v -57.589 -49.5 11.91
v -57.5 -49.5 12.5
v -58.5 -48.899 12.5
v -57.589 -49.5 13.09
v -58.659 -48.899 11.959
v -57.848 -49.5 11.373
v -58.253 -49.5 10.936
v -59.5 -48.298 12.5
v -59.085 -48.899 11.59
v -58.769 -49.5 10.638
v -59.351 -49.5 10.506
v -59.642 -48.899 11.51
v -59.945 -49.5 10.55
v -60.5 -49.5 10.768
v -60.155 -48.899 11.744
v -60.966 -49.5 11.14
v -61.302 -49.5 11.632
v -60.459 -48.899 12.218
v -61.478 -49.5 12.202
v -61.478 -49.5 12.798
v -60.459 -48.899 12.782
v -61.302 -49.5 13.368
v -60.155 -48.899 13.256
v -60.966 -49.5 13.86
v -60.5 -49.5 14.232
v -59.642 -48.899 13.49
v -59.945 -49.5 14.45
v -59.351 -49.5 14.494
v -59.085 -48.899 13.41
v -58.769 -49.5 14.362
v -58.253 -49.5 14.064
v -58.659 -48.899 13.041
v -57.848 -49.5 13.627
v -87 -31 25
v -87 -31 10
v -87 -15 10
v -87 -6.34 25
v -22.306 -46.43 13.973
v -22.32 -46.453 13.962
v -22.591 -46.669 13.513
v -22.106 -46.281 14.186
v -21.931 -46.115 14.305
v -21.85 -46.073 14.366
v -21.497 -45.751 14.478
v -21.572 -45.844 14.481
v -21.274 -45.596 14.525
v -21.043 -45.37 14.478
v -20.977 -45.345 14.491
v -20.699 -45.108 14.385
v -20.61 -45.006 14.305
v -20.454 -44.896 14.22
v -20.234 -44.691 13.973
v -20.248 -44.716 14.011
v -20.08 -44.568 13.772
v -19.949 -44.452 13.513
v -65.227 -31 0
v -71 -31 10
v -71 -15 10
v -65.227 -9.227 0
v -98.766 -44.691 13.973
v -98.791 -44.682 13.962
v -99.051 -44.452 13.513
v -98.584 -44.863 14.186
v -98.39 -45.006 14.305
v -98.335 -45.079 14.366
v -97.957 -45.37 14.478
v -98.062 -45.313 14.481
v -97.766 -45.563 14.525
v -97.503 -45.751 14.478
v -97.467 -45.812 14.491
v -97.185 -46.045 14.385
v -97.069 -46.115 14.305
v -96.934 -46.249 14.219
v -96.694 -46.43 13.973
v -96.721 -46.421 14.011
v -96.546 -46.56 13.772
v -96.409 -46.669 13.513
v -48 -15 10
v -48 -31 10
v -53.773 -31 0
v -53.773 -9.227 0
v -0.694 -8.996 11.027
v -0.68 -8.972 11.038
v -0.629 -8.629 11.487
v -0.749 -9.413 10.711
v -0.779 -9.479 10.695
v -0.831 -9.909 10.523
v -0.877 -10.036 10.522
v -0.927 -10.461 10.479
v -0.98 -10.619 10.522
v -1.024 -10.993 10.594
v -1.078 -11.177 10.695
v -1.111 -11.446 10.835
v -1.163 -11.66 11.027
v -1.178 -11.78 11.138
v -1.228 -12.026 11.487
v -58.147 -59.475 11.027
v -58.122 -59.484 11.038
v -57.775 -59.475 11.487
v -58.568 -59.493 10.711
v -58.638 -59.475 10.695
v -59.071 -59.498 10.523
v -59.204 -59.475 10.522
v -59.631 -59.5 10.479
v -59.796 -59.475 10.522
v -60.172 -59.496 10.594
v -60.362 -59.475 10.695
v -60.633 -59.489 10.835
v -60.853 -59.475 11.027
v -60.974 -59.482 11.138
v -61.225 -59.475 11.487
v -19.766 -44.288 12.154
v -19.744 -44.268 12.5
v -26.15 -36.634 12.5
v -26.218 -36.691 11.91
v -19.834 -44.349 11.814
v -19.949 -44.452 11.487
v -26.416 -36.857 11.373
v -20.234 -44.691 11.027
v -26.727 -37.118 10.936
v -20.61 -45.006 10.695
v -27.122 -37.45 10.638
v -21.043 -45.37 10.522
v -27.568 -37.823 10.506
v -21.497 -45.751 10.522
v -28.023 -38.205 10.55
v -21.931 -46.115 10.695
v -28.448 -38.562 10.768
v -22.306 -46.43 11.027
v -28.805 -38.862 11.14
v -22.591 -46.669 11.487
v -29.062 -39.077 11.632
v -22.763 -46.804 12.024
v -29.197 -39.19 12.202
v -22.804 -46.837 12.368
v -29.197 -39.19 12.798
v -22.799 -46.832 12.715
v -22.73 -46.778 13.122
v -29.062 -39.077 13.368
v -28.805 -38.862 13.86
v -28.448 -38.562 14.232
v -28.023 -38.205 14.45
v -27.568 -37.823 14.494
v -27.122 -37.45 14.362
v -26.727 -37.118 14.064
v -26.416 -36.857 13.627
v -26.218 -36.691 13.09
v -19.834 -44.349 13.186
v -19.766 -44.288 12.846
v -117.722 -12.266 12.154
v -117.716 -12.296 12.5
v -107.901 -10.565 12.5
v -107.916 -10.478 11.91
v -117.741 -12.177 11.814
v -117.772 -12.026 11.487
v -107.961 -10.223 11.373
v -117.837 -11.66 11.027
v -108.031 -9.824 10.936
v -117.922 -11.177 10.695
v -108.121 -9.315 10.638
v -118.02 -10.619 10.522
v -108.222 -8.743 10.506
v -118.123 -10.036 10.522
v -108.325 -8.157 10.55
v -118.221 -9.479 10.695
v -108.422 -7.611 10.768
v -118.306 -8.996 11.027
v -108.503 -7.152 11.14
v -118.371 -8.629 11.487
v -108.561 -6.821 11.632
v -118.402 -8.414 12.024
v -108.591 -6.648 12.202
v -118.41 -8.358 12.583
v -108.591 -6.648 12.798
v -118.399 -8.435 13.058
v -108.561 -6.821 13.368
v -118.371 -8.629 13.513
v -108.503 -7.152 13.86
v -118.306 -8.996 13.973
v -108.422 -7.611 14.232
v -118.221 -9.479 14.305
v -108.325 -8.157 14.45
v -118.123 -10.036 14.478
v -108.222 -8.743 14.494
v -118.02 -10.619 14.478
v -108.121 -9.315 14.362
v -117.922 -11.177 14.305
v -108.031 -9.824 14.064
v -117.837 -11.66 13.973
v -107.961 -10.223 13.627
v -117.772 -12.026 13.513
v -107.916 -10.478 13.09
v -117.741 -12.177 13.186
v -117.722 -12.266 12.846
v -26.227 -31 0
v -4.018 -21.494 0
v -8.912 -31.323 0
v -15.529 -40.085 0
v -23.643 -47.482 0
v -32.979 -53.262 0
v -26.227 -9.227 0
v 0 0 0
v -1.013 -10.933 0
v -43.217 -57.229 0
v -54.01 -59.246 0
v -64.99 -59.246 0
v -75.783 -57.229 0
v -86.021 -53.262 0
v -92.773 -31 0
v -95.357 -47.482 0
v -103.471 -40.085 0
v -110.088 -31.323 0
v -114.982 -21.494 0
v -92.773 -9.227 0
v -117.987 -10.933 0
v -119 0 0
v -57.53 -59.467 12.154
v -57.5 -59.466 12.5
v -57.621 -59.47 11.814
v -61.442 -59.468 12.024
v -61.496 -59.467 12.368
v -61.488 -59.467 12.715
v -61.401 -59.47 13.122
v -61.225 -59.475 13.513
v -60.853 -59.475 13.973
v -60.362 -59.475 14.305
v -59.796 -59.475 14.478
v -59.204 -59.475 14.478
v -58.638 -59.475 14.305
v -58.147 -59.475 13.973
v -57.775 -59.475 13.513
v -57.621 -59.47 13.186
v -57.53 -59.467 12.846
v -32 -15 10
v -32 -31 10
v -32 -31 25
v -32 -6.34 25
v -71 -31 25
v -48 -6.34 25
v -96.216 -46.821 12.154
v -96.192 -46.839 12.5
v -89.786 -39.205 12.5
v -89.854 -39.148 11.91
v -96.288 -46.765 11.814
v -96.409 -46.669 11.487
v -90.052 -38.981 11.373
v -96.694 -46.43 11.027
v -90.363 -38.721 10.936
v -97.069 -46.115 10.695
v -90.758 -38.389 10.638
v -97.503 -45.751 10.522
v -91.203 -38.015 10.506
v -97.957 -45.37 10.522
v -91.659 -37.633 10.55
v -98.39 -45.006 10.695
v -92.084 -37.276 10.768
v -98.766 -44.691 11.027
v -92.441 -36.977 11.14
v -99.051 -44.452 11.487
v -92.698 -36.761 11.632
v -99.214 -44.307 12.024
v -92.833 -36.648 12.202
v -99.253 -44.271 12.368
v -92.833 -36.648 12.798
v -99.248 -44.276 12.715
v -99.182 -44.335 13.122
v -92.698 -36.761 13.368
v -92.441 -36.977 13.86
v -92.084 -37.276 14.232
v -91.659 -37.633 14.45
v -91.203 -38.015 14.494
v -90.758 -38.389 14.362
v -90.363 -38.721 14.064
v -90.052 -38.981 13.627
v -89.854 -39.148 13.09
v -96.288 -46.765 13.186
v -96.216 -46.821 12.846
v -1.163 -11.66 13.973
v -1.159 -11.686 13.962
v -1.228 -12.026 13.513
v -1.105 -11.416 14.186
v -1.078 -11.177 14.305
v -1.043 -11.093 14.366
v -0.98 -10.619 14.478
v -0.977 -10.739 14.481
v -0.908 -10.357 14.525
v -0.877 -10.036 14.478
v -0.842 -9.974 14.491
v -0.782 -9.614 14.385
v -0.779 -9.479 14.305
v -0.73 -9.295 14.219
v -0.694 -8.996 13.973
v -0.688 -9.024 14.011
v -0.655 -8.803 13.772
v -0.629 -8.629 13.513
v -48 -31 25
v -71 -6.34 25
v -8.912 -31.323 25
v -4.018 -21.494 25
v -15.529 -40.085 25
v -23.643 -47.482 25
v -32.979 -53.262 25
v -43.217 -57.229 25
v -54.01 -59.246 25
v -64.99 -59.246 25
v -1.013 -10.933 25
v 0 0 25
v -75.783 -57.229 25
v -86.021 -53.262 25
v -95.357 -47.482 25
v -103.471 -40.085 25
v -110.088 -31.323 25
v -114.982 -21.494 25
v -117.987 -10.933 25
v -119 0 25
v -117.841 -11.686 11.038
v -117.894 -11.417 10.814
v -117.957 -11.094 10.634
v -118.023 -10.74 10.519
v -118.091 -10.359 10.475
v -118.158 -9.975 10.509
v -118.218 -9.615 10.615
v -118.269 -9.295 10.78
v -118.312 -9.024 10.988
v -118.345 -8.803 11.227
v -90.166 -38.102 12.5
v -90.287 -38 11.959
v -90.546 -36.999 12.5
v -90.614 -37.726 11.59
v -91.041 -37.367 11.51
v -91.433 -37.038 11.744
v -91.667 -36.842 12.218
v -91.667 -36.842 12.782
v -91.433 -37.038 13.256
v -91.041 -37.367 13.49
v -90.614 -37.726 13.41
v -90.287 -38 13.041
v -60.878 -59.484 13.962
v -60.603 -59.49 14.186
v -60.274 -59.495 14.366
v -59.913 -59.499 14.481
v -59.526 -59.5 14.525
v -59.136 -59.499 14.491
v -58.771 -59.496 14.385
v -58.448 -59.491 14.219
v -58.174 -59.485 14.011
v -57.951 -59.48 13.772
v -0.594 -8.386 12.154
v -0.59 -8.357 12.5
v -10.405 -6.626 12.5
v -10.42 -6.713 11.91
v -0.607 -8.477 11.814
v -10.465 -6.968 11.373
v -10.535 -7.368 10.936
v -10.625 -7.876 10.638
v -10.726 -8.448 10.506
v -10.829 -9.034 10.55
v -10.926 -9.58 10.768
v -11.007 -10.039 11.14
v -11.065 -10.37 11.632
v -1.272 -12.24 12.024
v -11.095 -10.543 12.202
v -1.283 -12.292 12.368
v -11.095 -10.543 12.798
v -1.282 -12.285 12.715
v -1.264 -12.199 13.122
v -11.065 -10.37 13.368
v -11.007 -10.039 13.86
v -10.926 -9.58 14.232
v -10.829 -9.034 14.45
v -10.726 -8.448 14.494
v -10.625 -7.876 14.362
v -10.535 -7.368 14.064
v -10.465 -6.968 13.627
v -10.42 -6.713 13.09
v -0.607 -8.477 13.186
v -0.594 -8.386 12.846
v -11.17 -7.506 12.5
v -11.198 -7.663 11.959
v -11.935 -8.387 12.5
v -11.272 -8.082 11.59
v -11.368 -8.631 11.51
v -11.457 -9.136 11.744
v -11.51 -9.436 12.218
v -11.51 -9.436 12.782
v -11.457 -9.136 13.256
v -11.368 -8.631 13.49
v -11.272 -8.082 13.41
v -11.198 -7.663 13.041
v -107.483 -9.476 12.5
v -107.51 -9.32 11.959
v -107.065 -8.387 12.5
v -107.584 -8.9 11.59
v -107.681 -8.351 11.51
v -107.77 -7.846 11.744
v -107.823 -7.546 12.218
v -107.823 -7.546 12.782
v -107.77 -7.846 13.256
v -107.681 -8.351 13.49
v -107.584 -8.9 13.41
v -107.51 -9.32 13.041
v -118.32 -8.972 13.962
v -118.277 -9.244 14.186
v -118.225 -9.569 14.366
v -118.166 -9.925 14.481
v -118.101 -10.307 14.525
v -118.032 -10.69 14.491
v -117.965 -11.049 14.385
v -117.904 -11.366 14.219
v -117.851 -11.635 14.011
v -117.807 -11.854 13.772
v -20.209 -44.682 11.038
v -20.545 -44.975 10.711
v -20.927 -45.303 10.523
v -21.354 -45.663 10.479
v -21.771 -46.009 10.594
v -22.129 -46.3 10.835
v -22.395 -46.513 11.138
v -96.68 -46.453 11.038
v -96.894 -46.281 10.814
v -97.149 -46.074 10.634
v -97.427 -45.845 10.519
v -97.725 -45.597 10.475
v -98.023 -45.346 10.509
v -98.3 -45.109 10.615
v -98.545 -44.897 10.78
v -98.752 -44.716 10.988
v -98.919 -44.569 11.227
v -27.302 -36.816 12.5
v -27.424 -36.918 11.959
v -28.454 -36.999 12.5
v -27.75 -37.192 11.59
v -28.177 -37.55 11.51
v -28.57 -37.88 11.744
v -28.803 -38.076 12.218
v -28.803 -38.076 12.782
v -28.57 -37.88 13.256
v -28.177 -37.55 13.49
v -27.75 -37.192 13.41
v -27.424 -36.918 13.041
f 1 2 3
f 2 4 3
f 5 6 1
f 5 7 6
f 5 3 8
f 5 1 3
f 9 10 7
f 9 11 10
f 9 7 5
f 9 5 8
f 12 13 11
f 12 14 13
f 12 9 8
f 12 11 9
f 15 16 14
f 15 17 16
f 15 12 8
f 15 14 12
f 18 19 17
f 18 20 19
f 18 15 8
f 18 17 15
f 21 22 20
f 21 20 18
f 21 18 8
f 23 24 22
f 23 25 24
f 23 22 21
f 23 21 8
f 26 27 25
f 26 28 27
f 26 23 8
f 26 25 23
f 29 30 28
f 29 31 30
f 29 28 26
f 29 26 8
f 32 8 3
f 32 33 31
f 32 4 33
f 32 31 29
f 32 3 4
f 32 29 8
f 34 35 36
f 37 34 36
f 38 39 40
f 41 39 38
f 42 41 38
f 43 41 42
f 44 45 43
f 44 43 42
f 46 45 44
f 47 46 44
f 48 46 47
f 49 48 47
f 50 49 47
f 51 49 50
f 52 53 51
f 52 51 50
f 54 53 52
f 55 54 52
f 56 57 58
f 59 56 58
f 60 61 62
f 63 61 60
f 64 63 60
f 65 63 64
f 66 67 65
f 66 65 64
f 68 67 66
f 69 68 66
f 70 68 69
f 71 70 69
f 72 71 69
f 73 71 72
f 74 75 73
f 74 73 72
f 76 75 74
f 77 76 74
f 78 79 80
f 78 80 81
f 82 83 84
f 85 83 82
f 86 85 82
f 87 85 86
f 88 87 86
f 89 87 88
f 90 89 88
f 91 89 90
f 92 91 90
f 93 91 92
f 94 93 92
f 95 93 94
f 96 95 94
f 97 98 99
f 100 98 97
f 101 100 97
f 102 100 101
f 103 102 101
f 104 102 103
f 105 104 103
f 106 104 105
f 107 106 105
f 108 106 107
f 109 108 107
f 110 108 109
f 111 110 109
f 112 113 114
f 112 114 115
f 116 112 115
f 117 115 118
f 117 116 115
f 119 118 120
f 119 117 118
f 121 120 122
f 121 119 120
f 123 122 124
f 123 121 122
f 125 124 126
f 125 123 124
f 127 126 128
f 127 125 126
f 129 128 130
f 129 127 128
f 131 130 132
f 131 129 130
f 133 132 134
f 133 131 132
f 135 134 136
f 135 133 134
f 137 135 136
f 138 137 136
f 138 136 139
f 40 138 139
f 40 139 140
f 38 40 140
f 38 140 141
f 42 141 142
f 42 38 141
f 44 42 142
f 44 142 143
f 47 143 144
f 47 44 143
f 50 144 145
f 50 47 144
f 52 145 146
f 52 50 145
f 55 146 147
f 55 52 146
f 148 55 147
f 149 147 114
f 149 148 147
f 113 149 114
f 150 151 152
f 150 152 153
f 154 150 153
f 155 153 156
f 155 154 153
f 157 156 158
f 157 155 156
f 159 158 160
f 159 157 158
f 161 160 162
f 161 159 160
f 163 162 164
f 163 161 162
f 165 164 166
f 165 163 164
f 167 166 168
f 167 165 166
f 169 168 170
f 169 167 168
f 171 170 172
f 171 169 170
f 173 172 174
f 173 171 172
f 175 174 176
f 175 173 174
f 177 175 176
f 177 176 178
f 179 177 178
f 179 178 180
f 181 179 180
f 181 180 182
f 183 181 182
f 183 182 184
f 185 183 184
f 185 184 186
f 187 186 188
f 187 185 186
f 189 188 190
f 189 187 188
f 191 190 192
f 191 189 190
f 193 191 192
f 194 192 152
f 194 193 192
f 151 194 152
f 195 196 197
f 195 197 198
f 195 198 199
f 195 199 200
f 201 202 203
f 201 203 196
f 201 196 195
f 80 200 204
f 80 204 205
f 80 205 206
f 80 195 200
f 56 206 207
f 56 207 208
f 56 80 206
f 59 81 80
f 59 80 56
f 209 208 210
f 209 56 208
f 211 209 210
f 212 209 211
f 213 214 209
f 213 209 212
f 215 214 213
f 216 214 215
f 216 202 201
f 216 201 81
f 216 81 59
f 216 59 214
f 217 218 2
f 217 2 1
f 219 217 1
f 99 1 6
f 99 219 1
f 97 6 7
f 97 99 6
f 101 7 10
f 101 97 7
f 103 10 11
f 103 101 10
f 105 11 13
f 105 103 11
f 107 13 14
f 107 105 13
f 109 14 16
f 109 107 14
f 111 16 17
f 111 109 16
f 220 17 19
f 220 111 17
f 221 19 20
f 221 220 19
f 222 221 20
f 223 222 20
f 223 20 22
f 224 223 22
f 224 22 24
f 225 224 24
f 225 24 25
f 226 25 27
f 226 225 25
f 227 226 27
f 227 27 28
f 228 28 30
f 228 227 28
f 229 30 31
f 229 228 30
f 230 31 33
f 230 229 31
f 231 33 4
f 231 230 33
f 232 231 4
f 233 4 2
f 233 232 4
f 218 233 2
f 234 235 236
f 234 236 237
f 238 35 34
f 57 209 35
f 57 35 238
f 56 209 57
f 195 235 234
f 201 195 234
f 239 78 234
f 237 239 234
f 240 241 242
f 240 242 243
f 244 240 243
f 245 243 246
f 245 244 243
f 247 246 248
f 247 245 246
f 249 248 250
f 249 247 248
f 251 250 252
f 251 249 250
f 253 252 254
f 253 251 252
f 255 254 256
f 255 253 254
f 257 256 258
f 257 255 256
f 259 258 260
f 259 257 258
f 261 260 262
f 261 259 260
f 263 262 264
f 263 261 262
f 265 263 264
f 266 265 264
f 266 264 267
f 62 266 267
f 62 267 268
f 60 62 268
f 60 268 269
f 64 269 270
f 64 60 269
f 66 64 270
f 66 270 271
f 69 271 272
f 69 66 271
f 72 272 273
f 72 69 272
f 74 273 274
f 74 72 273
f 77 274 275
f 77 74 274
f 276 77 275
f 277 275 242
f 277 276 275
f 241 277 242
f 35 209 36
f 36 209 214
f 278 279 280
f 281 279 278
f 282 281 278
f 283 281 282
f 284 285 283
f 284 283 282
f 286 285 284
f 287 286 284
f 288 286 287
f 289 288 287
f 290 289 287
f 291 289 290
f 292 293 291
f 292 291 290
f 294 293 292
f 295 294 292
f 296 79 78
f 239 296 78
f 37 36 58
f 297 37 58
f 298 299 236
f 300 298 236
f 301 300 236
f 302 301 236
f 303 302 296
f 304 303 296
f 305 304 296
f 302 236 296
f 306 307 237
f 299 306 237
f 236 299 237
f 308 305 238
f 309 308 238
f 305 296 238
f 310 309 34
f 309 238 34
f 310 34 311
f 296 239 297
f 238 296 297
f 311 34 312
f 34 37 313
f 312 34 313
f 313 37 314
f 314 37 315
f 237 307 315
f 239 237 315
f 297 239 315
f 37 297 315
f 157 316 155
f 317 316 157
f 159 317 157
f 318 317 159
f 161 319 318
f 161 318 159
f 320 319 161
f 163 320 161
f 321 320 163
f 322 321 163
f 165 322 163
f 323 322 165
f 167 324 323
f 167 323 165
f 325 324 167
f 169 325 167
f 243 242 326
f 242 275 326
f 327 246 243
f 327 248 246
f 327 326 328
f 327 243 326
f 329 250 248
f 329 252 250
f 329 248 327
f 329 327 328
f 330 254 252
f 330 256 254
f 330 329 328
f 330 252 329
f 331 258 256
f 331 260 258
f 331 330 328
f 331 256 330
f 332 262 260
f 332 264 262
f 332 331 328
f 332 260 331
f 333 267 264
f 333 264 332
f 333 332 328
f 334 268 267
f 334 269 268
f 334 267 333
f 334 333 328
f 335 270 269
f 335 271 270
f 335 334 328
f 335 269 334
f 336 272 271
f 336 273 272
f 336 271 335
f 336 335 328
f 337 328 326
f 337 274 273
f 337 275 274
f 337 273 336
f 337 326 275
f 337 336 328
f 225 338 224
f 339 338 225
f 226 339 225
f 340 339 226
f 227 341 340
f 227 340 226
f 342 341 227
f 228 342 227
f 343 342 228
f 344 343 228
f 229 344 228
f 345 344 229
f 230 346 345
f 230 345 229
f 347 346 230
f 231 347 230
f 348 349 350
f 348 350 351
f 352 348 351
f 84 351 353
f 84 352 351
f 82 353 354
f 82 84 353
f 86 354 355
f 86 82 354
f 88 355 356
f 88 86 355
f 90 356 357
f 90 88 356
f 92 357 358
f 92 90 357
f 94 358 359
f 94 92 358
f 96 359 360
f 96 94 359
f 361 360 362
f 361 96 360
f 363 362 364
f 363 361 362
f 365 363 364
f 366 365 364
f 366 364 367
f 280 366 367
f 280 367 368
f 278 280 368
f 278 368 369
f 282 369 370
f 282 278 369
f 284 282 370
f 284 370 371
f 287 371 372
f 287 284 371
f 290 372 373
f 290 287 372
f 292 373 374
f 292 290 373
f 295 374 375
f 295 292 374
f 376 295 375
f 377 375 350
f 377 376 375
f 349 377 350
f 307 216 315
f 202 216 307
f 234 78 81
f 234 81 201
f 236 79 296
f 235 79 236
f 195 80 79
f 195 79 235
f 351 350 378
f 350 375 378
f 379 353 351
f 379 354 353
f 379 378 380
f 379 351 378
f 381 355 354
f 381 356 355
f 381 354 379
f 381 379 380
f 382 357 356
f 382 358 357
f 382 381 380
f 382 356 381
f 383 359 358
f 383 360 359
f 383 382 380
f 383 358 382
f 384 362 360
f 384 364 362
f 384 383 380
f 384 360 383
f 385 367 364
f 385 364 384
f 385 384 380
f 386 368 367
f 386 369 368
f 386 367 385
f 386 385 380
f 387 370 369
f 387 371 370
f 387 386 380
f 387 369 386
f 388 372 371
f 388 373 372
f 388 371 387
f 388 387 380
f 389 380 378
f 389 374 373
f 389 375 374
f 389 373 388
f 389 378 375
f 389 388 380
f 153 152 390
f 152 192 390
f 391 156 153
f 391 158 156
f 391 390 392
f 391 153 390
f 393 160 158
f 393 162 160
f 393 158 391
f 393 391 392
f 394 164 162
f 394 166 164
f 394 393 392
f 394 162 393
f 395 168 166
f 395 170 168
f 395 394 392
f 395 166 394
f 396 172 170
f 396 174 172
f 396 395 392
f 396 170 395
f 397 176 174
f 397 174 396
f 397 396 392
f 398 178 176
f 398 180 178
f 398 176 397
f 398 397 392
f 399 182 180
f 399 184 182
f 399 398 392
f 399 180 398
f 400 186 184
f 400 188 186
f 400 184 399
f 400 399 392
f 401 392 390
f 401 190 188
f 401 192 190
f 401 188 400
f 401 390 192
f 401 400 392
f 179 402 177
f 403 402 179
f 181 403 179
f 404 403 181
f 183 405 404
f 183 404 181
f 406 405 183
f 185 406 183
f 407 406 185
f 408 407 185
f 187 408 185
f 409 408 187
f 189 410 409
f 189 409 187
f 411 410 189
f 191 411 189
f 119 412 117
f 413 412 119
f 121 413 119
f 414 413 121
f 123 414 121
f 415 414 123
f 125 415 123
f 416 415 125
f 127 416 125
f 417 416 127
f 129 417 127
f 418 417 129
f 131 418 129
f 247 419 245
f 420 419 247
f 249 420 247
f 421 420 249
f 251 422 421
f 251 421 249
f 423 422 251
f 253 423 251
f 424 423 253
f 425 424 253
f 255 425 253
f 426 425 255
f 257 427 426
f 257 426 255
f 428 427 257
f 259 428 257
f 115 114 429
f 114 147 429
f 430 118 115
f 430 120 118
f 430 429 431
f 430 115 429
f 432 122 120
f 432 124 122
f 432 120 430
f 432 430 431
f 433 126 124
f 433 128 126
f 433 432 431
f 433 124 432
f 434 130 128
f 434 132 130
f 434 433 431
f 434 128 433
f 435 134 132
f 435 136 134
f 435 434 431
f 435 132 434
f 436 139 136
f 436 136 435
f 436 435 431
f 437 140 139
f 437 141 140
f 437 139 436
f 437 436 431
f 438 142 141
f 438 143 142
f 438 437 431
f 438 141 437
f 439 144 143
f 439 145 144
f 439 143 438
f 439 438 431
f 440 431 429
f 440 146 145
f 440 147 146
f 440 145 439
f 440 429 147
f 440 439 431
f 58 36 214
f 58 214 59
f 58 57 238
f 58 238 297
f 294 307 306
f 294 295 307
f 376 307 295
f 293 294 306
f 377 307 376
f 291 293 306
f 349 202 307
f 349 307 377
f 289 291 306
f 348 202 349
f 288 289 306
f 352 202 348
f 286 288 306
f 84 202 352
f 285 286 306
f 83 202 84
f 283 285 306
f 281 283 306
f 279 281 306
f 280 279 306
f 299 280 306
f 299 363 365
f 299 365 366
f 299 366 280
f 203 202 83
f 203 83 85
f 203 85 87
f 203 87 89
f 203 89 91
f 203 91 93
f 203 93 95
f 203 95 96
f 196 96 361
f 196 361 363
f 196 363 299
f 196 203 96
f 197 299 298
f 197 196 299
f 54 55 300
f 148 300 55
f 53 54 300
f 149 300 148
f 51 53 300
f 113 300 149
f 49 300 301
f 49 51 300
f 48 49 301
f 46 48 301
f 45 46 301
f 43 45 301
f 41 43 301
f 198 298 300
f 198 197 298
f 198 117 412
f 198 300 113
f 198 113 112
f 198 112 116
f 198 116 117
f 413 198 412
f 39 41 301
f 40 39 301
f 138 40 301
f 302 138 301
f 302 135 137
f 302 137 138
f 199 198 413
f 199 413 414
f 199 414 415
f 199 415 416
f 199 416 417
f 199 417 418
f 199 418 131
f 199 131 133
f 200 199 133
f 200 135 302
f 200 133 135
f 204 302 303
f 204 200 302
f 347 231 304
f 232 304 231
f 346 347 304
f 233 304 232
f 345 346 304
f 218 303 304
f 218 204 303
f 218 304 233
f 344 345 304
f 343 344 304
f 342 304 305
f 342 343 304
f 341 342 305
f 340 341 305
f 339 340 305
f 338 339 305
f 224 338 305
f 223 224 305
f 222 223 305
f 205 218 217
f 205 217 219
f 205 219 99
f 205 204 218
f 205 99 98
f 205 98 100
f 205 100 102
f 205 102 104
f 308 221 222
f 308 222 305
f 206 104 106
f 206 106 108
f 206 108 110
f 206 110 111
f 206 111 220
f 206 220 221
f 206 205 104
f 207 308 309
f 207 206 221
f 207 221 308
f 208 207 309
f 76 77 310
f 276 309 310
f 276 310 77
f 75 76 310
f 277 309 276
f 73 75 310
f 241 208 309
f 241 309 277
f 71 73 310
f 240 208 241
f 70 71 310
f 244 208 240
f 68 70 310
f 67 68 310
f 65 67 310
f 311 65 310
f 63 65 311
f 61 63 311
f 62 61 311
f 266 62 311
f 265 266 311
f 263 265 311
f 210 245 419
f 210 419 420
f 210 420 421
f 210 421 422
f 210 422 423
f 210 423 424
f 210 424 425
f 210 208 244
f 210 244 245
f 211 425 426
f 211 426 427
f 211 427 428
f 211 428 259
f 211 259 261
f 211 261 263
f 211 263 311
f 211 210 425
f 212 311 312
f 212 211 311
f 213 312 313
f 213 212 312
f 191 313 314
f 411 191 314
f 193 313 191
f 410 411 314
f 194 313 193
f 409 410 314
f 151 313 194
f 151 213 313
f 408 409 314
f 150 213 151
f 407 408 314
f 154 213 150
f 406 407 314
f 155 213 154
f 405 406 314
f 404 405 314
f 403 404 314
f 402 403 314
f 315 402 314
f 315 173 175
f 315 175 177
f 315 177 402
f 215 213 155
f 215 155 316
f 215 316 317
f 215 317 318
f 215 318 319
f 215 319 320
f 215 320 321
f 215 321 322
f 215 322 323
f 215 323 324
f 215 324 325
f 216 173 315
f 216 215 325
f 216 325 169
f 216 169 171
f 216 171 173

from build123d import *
from OCP.BRepFilletAPI import BRepFilletAPI_MakeChamfer

# Parameters (mm, degrees)
SKETCH1_W           = 16
SKETCH1_H           = 16
BOSS_EXTRUDE1_DEPTH = 25
CIRPATTERN1_COUNT   = 5
CIRPATTERN1_ANGLE   = 160
CHAMFER1_SIZE       = 15
CHAMFER1_SIZE2      = 8.660254038
CHAMFER2_SIZE       = 5.773502692
CHAMFER2_SIZE_2     = 10


with BuildPart() as part:
    # Sketch1 → Boss-Extrude1 (new body)
    with BuildSketch(Plane.XY):
        with BuildLine():
            Line((-119, 0), (0, 0))
            ThreePointArc((0, 0), (-59.5, -59.5), (-119, 0))
        make_face()
        with Locations((-40, -23)):
            Rectangle(SKETCH1_W, SKETCH1_H, mode=Mode.SUBTRACT)
        with Locations((-79, -23)):
            Rectangle(SKETCH1_W, SKETCH1_H, mode=Mode.SUBTRACT)
    extrude(amount=BOSS_EXTRUDE1_DEPTH)

    # Sketch4 → Ø4.0mm Dowel Hole2 (revolve, cut)
    with BuildSketch(Plane(origin=(-0.903938696, -10.332066571, 12.5), x_dir=(0.1736481776669305, 0.9848077530122081, 0), z_dir=(0, 0, 1))):
        Polygon((0, 0), (0, 11.201721238), (2, 10), (2, 0.025), (2.025, 0), align=None)
    f_4_0mm_dowel_hole2 = revolve(axis=Axis((5.349590536, -11.434732499, 12.5), (-0.9848077530122081, 0.1736481776669305, 0)), mode=Mode.SUBTRACT)

    # CirPattern1: Ø4.0mm Dowel Hole2 ×5 about axis
    cirpattern1_axis = Axis((-59.5, 0, 0), (0, 0, -1))
    for i in range(1, CIRPATTERN1_COUNT):
        add(f_4_0mm_dowel_hole2.rotate(cirpattern1_axis, i * CIRPATTERN1_ANGLE / (CIRPATTERN1_COUNT - 1)), mode=Mode.SUBTRACT)

    # Chamfer1: one chamfer whose edges measure the first distance from different faces: ONE call of the kernel's chamfer builder (chamfer() names one face for all edges)
    chamfer1_edges_1 = [part.edges().sort_by_distance(p)[0] for p in [
        (-40, -15, 25),
    ]]
    chamfer1_side_1 = [part.faces().sort_by_distance(p)[0] for p in [
        (-40, -15, 12.5),
    ]]
    chamfer1_edges_2 = [part.edges().sort_by_distance(p)[0] for p in [
        (-79, -15, 25),
    ]]
    chamfer1_side_2 = [part.faces().sort_by_distance(p)[0] for p in [
        (-79, -15, 12.5),
    ]]
    chamfer1 = BRepFilletAPI_MakeChamfer(part.part.solid().wrapped)
    for e in chamfer1_edges_1:
        chamfer1.Add(CHAMFER1_SIZE, CHAMFER1_SIZE2, e.wrapped, chamfer1_side_1[0].wrapped)  # the first distance lies on this face
    for e in chamfer1_edges_2:
        chamfer1.Add(CHAMFER1_SIZE, CHAMFER1_SIZE2, e.wrapped, chamfer1_side_2[0].wrapped)  # the first distance lies on this face
    add(Compound.cast(chamfer1.Shape()), mode=Mode.REPLACE)

    # Chamfer2
    chamfer2_edges_1 = [part.edges().sort_by_distance(p)[0] for p in [
        (-48, -23, 0),
    ]]
    chamfer2_side_1 = [part.faces().sort_by_distance(p)[0] for p in [
        (-48.115470054, -23, 0),
    ]]
    chamfer2_edges_2 = [part.edges().sort_by_distance(p)[0] for p in [
        (-40, -15, 0),
    ]]
    chamfer2_side_2 = [part.faces().sort_by_distance(p)[0] for p in [
        (-40, -14.884529946, 0),
    ]]
    chamfer2_edges_3 = [part.edges().sort_by_distance(p)[0] for p in [
        (-32, -23, 0),
    ]]
    chamfer2_side_3 = [part.faces().sort_by_distance(p)[0] for p in [
        (-31.884529946, -23, 0),
    ]]
    chamfer2_edges_4 = [part.edges().sort_by_distance(p)[0] for p in [
        (-87, -23, 0),
    ]]
    chamfer2_side_4 = [part.faces().sort_by_distance(p)[0] for p in [
        (-87, -23, 0.115470054),
    ]]
    chamfer2_edges_5 = [part.edges().sort_by_distance(p)[0] for p in [
        (-79, -15, 0),
    ]]
    chamfer2_side_5 = [part.faces().sort_by_distance(p)[0] for p in [
        (-79, -14.884529946, 0),
    ]]
    chamfer2_edges_6 = [part.edges().sort_by_distance(p)[0] for p in [
        (-71, -23, 0),
    ]]
    chamfer2_side_6 = [part.faces().sort_by_distance(p)[0] for p in [
        (-70.884529946, -23, 0),
    ]]
    chamfer2 = BRepFilletAPI_MakeChamfer(part.part.solid().wrapped)
    for e in chamfer2_edges_1:
        chamfer2.Add(CHAMFER2_SIZE - 0.0001, CHAMFER2_SIZE_2 - 0.0001, e.wrapped, chamfer2_side_1[0].wrapped)
    for e in chamfer2_edges_2:
        chamfer2.Add(CHAMFER2_SIZE - 0.0001, CHAMFER2_SIZE_2 - 0.0001, e.wrapped, chamfer2_side_2[0].wrapped)
    for e in chamfer2_edges_3:
        chamfer2.Add(CHAMFER2_SIZE - 0.0001, CHAMFER2_SIZE_2 - 0.0001, e.wrapped, chamfer2_side_3[0].wrapped)
    for e in chamfer2_edges_4:
        chamfer2.Add(CHAMFER2_SIZE_2 - 0.0001, CHAMFER2_SIZE - 0.0001, e.wrapped, chamfer2_side_4[0].wrapped)
    for e in chamfer2_edges_5:
        chamfer2.Add(CHAMFER2_SIZE - 0.0001, CHAMFER2_SIZE_2 - 0.0001, e.wrapped, chamfer2_side_5[0].wrapped)
    for e in chamfer2_edges_6:
        chamfer2.Add(CHAMFER2_SIZE - 0.0001, CHAMFER2_SIZE_2 - 0.0001, e.wrapped, chamfer2_side_6[0].wrapped)
    add(Compound.cast(chamfer2.Shape()), mode=Mode.REPLACE)  # a hair under: the kernel refuses the full size


solid = part.part
